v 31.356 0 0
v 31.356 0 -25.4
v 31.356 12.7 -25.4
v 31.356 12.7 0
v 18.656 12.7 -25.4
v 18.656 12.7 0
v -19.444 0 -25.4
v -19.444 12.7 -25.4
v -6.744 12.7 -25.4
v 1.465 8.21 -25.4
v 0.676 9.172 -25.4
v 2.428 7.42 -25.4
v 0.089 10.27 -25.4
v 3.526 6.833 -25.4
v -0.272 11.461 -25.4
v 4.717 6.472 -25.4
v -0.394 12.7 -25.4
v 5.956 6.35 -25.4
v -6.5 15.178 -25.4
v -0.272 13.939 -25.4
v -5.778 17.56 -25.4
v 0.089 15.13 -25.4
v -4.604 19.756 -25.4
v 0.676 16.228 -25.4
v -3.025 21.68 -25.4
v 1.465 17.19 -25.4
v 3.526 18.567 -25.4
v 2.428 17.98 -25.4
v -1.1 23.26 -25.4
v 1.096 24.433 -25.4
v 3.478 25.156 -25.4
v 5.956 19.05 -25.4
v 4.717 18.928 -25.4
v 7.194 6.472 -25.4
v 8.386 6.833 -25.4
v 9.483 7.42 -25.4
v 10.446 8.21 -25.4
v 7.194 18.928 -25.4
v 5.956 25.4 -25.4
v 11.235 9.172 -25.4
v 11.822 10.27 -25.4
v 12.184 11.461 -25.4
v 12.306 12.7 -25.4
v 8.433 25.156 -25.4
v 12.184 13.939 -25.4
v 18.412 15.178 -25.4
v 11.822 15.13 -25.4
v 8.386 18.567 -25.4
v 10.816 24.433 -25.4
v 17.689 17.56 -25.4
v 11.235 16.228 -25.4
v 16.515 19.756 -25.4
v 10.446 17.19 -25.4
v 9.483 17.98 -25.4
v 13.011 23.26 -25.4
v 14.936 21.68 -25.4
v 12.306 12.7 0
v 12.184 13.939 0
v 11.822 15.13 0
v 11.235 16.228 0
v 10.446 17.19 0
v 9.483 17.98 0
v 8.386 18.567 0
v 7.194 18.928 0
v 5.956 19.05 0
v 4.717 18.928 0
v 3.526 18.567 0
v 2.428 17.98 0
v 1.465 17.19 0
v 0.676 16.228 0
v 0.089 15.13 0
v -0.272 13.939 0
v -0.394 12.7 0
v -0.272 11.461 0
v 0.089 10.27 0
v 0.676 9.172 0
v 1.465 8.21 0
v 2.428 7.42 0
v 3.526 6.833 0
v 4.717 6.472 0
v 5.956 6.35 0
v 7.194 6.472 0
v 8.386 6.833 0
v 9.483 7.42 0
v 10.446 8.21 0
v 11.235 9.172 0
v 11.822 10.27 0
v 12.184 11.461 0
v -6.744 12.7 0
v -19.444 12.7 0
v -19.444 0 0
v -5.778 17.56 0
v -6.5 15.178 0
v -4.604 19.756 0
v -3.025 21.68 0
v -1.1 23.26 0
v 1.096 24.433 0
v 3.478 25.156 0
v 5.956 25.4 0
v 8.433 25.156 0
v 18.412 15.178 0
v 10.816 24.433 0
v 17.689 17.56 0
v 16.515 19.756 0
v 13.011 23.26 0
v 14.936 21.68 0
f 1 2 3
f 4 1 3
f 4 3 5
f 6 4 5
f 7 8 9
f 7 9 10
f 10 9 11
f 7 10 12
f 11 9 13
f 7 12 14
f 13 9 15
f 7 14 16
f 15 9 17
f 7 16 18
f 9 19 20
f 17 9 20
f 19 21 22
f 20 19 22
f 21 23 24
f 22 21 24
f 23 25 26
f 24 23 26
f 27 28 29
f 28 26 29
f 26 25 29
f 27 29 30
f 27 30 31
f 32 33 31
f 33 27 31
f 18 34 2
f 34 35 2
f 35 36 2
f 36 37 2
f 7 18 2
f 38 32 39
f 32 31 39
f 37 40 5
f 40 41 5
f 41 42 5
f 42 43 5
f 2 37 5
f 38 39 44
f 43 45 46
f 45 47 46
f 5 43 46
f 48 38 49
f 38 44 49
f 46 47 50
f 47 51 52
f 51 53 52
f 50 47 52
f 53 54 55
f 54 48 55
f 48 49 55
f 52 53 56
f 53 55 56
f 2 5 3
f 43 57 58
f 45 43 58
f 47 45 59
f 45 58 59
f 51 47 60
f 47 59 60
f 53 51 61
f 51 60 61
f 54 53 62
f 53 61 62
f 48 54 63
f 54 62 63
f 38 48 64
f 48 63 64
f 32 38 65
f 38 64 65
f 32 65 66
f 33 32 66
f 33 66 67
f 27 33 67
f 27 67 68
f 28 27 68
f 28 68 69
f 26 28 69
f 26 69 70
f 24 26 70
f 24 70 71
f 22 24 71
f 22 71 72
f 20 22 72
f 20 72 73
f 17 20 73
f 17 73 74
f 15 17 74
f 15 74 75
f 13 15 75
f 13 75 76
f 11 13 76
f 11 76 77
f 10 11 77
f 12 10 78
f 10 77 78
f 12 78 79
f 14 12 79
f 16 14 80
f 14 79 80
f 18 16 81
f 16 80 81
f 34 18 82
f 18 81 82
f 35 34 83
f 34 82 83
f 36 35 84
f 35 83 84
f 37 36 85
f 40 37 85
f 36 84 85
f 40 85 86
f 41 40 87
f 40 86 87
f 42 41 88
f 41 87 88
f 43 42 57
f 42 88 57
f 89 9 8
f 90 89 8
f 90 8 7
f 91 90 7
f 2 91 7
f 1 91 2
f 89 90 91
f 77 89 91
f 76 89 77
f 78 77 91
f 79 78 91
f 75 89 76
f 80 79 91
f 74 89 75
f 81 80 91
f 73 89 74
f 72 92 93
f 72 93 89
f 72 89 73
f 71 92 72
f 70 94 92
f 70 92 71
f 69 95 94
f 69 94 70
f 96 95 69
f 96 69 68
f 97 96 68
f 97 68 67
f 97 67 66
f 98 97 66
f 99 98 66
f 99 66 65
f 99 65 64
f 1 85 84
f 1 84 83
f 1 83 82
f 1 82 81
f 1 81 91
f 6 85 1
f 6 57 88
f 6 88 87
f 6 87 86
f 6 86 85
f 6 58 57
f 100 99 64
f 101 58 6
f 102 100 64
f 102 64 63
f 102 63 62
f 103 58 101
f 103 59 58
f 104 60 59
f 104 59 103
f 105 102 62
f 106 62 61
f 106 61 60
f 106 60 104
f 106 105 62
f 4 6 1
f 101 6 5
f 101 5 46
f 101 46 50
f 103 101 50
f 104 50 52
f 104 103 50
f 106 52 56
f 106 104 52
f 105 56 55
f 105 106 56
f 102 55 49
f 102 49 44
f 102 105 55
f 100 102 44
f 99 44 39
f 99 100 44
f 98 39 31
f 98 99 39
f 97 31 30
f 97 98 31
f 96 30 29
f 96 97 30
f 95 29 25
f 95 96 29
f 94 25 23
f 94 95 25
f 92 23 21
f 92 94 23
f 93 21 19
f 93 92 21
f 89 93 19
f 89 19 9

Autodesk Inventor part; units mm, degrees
ref_plane "YZ Plane" through (0, 0, 0) normal (1, 0, 0) x (0, 1, 0)
ref_plane "XZ Plane" through (0, 0, 0) normal (0, 1, 0) x (-1, 0, 0)
ref_plane "XY Plane" through (0, 0, 0) normal (0, 0, 1) x (1, 0, 0)
sketch "Sketch1" plane through (0, 0, 0) normal (0, 0, 1) x (1, 0, 0)
  line L0 (-19.4444, 0) -> (31.3556, 0)
  line L1 (31.3556, 0) -> (31.3556, 12.7)
  line L2 (31.3556, 12.7) -> (-19.4444, 12.7)
  line L3 (-19.4444, 12.7) -> (-19.4444, 0)
  circle A0 centre (5.9556, 12.7) radius 6.35
  circle A1 centre (5.9556, 12.7) radius 12.7
  point P0 (0, 0)
  dimension "d0" = 50.8
  dimension "d2" = 12.7
  dimension "d3" = 12.7
  dimension "d4" = 25.4
extrude "Extrusion1" add sketch "Sketch1" against normal blind 25.4 contours L3 L2 A1 L0 | A1 L2 L1 L0 | A1 L2 A0 | A1 L2 A0 | L2 A0 picked at (5.205, 10.7209)
extrude "Extrusion2" cut sketch "Sketch1" against normal blind 25.4 contours A0 L2 | L2 A0
properties part number "proxybearing"
